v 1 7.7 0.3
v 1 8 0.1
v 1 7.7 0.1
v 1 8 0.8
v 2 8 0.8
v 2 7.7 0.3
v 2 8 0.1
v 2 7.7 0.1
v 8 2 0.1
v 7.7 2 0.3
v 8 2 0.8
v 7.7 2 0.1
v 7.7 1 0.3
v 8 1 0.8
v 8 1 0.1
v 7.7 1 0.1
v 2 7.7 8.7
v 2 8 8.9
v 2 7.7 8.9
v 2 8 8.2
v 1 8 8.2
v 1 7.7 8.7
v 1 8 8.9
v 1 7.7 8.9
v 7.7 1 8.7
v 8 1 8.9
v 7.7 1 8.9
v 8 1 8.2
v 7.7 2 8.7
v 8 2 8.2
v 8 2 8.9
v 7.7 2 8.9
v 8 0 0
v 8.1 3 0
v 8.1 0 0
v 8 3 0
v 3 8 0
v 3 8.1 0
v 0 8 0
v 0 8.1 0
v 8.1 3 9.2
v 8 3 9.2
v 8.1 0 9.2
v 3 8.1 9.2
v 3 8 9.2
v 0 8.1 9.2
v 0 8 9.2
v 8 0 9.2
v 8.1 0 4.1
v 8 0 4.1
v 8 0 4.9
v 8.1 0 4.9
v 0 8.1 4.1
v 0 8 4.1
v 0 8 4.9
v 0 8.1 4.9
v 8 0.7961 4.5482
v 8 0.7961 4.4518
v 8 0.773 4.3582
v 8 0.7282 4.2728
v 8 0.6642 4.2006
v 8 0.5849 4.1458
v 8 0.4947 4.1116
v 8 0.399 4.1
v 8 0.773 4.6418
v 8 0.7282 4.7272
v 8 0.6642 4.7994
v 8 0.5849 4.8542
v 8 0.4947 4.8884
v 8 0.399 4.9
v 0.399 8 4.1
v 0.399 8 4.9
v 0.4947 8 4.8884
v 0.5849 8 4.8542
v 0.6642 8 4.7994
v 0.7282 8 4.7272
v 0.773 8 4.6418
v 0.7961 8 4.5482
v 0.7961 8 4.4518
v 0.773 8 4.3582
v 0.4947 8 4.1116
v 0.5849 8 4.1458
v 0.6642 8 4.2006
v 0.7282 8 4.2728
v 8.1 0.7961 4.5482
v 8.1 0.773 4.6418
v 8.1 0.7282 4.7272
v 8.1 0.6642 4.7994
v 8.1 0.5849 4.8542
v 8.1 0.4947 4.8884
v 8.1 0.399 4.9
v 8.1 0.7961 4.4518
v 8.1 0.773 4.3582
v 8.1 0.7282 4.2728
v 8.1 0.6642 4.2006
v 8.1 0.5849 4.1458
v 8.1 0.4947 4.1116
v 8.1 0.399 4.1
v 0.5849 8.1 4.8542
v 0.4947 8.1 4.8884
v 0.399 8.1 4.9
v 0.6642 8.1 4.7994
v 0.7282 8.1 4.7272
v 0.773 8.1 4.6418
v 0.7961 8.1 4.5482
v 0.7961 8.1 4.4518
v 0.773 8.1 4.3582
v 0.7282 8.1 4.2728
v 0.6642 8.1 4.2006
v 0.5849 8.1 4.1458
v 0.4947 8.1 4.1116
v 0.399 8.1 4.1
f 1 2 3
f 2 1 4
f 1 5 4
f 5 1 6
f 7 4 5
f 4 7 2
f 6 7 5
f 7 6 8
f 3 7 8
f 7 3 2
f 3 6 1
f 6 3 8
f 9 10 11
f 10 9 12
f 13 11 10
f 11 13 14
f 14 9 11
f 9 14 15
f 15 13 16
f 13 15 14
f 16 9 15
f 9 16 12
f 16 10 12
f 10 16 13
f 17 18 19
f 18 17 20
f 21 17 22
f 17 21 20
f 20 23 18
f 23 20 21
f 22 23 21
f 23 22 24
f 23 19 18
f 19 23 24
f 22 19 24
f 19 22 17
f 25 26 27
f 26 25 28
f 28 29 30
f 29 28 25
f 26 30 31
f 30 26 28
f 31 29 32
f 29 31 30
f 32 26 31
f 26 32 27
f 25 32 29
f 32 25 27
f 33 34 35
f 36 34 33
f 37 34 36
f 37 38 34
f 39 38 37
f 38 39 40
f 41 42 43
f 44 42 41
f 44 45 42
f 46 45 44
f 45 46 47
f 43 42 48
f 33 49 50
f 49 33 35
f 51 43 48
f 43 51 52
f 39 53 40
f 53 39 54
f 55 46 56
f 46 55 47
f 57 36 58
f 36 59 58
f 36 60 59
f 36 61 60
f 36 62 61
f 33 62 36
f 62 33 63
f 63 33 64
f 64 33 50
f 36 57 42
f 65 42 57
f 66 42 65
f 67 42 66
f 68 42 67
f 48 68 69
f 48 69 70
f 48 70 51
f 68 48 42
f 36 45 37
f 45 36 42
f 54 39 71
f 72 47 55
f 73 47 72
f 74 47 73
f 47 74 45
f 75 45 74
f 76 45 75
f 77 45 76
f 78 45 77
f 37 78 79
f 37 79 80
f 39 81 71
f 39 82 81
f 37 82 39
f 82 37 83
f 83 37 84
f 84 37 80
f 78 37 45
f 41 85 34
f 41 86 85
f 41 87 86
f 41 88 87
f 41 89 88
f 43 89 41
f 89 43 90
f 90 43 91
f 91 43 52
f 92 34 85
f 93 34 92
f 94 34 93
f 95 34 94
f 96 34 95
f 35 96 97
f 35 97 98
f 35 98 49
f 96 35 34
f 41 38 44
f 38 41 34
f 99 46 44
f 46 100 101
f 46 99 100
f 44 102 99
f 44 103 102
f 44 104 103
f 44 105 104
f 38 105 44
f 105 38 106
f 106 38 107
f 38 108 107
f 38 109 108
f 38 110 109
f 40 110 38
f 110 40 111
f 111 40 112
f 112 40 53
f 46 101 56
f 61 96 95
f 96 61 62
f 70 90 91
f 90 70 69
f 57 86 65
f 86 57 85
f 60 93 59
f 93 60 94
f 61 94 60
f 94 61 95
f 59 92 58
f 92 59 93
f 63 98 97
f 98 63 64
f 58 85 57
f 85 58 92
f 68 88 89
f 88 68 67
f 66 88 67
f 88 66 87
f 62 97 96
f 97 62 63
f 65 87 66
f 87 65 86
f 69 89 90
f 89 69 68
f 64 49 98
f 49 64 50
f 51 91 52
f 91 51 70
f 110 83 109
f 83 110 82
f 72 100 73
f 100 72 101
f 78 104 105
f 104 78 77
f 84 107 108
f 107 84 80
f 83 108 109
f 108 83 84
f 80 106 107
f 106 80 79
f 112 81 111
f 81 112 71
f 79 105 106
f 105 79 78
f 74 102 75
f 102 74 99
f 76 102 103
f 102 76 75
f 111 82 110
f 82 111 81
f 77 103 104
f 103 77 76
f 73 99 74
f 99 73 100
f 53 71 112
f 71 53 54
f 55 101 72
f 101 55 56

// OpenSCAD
$fn = 0;    //número de fragmentos
$fa = 8;    //ángulo mínimo
$fs = 0.1;  //tamaño mínimo

offset = 0.001;

grosorParedes = 0.1;
alturaCaja = 9;
alturaTapa = alturaCaja + 0.2;

figuraParaMostrar = 1;
if(figuraParaMostrar == 0){
    cajaDePared();
    }
if(figuraParaMostrar == 1){
    tapaConAgujeros();
    }
if(figuraParaMostrar == 2){
    cajaDePared();
    tapaConAgujeros();
    }
    
    
module agujeros(){
    union(){
        cylinder(0.5, d = 0.8);
        translate([-0.4,0,0])
        cube([0.8, 0.4, 0.5]);
    
        }
    }

module tapaConAgujeros(){
    difference(){
        tapa();
    
        translate([8.3,0.4 - offset,4.5])
        rotate([0,90,180])
        agujeros();
    
        translate([0.4 - offset,7.8,4.5])
        rotate([-90,90,0])
        agujeros();
        
        }
    }

module tapa(){
    cubePoints = [
    [8,0,0],
    [8,3,0],
    [3,8,0],
    [0,8,0],
    
    [0,                 8 + grosorParedes,  0],
    [3,                 8 + grosorParedes,  0],
    [8 + grosorParedes, 3,                  0],
    [8 + grosorParedes, 0,                  0],
    
    [8,0,alturaTapa],
    [8,3,alturaTapa],
    [3,8,alturaTapa],
    [0,8,alturaTapa],
    
    [0,                 8 + grosorParedes,  alturaTapa],
    [3,                 8 + grosorParedes,  alturaTapa],
    [8 + grosorParedes, 3,                  alturaTapa],
    [8 + grosorParedes, 0,                  alturaTapa]
    ];

    cubeFaces = [
    [0,7,6,5,4,3,2,1],
    [8,9,10,11,12,13,14,15],
    [0,8,15,7],
    [3,4,12,11],
    [0,1,9,8],
    [1,2,10,9],
    [2,3,11,10],
    [7,15,14,6],
    [6,14,13,5],
    [5,13,12,4]
    ];
    
    polyhedron(cubePoints, cubeFaces);
    
    translate([1, 8 - grosorParedes * 3,    grosorParedes])
    soporte();

    translate([7.7, 2,                      grosorParedes])
    rotate([0,0,-90])
    soporte();

    translate([2, 8 - grosorParedes * 3,    alturaCaja - grosorParedes])
    rotate([0,180,0])
    soporte();

    translate([7.7, 1,                      alturaCaja - grosorParedes])
    rotate([-180,0,90])
    soporte();
    
    
    }

module cajaDePared(){
    difference(){
        union(){
            cube([8,                grosorParedes,  alturaCaja]);
            cube([grosorParedes,    8,              alturaCaja]);
            ladoPoli(0);
            ladoPoli(alturaCaja - grosorParedes);
        }
    
        translate([5.22,5.22,-0.2])
        rotate([0,0,-45])
        agujeros();
        }
    
    }

module ladoPoli(altura){
    cubePoints = [
    [0,0,altura],
    [8,0,altura],
    [8,3,altura],
    [3,8,altura],
    [0,8,altura],

    [0,0,altura + grosorParedes],
    [8,0,altura + grosorParedes],
    [8,3,altura + grosorParedes],
    [3,8,altura + grosorParedes],
    [0,8,altura + grosorParedes]
    ];

    cubeFaces = [
    [0,1,2,3,4],
    [5,9,8,7,6],
    [0,5,6,1],
    [1,6,7,2],
    [2,7,8,3],
    [3,8,9,4],
    [4,9,5,0]
    ];
    polyhedron(cubePoints, cubeFaces);
    }
    

module soporte(){
    union(){
        translate([0,0,0.2])
        triangulosSoportes();
        cube([1, 0.3, 0.2]);
    
        }
    }

module triangulosSoportes(){
    cubePoints = [
    [0,0,0],
    [0,0.3,0],
    [0,0.3,0.5],
    
    [1,0,0],
    [1,0.3,0],
    [1,0.3,0.5]
    
    ];
    
    cubeFaces = [
    [0,1,2],
    [3,5,4],
    [5,3,0,2],
    [4,5,2,1],
    [3,4,1,0]
    ];
    
    polyhedron(cubePoints, cubeFaces);
    }
